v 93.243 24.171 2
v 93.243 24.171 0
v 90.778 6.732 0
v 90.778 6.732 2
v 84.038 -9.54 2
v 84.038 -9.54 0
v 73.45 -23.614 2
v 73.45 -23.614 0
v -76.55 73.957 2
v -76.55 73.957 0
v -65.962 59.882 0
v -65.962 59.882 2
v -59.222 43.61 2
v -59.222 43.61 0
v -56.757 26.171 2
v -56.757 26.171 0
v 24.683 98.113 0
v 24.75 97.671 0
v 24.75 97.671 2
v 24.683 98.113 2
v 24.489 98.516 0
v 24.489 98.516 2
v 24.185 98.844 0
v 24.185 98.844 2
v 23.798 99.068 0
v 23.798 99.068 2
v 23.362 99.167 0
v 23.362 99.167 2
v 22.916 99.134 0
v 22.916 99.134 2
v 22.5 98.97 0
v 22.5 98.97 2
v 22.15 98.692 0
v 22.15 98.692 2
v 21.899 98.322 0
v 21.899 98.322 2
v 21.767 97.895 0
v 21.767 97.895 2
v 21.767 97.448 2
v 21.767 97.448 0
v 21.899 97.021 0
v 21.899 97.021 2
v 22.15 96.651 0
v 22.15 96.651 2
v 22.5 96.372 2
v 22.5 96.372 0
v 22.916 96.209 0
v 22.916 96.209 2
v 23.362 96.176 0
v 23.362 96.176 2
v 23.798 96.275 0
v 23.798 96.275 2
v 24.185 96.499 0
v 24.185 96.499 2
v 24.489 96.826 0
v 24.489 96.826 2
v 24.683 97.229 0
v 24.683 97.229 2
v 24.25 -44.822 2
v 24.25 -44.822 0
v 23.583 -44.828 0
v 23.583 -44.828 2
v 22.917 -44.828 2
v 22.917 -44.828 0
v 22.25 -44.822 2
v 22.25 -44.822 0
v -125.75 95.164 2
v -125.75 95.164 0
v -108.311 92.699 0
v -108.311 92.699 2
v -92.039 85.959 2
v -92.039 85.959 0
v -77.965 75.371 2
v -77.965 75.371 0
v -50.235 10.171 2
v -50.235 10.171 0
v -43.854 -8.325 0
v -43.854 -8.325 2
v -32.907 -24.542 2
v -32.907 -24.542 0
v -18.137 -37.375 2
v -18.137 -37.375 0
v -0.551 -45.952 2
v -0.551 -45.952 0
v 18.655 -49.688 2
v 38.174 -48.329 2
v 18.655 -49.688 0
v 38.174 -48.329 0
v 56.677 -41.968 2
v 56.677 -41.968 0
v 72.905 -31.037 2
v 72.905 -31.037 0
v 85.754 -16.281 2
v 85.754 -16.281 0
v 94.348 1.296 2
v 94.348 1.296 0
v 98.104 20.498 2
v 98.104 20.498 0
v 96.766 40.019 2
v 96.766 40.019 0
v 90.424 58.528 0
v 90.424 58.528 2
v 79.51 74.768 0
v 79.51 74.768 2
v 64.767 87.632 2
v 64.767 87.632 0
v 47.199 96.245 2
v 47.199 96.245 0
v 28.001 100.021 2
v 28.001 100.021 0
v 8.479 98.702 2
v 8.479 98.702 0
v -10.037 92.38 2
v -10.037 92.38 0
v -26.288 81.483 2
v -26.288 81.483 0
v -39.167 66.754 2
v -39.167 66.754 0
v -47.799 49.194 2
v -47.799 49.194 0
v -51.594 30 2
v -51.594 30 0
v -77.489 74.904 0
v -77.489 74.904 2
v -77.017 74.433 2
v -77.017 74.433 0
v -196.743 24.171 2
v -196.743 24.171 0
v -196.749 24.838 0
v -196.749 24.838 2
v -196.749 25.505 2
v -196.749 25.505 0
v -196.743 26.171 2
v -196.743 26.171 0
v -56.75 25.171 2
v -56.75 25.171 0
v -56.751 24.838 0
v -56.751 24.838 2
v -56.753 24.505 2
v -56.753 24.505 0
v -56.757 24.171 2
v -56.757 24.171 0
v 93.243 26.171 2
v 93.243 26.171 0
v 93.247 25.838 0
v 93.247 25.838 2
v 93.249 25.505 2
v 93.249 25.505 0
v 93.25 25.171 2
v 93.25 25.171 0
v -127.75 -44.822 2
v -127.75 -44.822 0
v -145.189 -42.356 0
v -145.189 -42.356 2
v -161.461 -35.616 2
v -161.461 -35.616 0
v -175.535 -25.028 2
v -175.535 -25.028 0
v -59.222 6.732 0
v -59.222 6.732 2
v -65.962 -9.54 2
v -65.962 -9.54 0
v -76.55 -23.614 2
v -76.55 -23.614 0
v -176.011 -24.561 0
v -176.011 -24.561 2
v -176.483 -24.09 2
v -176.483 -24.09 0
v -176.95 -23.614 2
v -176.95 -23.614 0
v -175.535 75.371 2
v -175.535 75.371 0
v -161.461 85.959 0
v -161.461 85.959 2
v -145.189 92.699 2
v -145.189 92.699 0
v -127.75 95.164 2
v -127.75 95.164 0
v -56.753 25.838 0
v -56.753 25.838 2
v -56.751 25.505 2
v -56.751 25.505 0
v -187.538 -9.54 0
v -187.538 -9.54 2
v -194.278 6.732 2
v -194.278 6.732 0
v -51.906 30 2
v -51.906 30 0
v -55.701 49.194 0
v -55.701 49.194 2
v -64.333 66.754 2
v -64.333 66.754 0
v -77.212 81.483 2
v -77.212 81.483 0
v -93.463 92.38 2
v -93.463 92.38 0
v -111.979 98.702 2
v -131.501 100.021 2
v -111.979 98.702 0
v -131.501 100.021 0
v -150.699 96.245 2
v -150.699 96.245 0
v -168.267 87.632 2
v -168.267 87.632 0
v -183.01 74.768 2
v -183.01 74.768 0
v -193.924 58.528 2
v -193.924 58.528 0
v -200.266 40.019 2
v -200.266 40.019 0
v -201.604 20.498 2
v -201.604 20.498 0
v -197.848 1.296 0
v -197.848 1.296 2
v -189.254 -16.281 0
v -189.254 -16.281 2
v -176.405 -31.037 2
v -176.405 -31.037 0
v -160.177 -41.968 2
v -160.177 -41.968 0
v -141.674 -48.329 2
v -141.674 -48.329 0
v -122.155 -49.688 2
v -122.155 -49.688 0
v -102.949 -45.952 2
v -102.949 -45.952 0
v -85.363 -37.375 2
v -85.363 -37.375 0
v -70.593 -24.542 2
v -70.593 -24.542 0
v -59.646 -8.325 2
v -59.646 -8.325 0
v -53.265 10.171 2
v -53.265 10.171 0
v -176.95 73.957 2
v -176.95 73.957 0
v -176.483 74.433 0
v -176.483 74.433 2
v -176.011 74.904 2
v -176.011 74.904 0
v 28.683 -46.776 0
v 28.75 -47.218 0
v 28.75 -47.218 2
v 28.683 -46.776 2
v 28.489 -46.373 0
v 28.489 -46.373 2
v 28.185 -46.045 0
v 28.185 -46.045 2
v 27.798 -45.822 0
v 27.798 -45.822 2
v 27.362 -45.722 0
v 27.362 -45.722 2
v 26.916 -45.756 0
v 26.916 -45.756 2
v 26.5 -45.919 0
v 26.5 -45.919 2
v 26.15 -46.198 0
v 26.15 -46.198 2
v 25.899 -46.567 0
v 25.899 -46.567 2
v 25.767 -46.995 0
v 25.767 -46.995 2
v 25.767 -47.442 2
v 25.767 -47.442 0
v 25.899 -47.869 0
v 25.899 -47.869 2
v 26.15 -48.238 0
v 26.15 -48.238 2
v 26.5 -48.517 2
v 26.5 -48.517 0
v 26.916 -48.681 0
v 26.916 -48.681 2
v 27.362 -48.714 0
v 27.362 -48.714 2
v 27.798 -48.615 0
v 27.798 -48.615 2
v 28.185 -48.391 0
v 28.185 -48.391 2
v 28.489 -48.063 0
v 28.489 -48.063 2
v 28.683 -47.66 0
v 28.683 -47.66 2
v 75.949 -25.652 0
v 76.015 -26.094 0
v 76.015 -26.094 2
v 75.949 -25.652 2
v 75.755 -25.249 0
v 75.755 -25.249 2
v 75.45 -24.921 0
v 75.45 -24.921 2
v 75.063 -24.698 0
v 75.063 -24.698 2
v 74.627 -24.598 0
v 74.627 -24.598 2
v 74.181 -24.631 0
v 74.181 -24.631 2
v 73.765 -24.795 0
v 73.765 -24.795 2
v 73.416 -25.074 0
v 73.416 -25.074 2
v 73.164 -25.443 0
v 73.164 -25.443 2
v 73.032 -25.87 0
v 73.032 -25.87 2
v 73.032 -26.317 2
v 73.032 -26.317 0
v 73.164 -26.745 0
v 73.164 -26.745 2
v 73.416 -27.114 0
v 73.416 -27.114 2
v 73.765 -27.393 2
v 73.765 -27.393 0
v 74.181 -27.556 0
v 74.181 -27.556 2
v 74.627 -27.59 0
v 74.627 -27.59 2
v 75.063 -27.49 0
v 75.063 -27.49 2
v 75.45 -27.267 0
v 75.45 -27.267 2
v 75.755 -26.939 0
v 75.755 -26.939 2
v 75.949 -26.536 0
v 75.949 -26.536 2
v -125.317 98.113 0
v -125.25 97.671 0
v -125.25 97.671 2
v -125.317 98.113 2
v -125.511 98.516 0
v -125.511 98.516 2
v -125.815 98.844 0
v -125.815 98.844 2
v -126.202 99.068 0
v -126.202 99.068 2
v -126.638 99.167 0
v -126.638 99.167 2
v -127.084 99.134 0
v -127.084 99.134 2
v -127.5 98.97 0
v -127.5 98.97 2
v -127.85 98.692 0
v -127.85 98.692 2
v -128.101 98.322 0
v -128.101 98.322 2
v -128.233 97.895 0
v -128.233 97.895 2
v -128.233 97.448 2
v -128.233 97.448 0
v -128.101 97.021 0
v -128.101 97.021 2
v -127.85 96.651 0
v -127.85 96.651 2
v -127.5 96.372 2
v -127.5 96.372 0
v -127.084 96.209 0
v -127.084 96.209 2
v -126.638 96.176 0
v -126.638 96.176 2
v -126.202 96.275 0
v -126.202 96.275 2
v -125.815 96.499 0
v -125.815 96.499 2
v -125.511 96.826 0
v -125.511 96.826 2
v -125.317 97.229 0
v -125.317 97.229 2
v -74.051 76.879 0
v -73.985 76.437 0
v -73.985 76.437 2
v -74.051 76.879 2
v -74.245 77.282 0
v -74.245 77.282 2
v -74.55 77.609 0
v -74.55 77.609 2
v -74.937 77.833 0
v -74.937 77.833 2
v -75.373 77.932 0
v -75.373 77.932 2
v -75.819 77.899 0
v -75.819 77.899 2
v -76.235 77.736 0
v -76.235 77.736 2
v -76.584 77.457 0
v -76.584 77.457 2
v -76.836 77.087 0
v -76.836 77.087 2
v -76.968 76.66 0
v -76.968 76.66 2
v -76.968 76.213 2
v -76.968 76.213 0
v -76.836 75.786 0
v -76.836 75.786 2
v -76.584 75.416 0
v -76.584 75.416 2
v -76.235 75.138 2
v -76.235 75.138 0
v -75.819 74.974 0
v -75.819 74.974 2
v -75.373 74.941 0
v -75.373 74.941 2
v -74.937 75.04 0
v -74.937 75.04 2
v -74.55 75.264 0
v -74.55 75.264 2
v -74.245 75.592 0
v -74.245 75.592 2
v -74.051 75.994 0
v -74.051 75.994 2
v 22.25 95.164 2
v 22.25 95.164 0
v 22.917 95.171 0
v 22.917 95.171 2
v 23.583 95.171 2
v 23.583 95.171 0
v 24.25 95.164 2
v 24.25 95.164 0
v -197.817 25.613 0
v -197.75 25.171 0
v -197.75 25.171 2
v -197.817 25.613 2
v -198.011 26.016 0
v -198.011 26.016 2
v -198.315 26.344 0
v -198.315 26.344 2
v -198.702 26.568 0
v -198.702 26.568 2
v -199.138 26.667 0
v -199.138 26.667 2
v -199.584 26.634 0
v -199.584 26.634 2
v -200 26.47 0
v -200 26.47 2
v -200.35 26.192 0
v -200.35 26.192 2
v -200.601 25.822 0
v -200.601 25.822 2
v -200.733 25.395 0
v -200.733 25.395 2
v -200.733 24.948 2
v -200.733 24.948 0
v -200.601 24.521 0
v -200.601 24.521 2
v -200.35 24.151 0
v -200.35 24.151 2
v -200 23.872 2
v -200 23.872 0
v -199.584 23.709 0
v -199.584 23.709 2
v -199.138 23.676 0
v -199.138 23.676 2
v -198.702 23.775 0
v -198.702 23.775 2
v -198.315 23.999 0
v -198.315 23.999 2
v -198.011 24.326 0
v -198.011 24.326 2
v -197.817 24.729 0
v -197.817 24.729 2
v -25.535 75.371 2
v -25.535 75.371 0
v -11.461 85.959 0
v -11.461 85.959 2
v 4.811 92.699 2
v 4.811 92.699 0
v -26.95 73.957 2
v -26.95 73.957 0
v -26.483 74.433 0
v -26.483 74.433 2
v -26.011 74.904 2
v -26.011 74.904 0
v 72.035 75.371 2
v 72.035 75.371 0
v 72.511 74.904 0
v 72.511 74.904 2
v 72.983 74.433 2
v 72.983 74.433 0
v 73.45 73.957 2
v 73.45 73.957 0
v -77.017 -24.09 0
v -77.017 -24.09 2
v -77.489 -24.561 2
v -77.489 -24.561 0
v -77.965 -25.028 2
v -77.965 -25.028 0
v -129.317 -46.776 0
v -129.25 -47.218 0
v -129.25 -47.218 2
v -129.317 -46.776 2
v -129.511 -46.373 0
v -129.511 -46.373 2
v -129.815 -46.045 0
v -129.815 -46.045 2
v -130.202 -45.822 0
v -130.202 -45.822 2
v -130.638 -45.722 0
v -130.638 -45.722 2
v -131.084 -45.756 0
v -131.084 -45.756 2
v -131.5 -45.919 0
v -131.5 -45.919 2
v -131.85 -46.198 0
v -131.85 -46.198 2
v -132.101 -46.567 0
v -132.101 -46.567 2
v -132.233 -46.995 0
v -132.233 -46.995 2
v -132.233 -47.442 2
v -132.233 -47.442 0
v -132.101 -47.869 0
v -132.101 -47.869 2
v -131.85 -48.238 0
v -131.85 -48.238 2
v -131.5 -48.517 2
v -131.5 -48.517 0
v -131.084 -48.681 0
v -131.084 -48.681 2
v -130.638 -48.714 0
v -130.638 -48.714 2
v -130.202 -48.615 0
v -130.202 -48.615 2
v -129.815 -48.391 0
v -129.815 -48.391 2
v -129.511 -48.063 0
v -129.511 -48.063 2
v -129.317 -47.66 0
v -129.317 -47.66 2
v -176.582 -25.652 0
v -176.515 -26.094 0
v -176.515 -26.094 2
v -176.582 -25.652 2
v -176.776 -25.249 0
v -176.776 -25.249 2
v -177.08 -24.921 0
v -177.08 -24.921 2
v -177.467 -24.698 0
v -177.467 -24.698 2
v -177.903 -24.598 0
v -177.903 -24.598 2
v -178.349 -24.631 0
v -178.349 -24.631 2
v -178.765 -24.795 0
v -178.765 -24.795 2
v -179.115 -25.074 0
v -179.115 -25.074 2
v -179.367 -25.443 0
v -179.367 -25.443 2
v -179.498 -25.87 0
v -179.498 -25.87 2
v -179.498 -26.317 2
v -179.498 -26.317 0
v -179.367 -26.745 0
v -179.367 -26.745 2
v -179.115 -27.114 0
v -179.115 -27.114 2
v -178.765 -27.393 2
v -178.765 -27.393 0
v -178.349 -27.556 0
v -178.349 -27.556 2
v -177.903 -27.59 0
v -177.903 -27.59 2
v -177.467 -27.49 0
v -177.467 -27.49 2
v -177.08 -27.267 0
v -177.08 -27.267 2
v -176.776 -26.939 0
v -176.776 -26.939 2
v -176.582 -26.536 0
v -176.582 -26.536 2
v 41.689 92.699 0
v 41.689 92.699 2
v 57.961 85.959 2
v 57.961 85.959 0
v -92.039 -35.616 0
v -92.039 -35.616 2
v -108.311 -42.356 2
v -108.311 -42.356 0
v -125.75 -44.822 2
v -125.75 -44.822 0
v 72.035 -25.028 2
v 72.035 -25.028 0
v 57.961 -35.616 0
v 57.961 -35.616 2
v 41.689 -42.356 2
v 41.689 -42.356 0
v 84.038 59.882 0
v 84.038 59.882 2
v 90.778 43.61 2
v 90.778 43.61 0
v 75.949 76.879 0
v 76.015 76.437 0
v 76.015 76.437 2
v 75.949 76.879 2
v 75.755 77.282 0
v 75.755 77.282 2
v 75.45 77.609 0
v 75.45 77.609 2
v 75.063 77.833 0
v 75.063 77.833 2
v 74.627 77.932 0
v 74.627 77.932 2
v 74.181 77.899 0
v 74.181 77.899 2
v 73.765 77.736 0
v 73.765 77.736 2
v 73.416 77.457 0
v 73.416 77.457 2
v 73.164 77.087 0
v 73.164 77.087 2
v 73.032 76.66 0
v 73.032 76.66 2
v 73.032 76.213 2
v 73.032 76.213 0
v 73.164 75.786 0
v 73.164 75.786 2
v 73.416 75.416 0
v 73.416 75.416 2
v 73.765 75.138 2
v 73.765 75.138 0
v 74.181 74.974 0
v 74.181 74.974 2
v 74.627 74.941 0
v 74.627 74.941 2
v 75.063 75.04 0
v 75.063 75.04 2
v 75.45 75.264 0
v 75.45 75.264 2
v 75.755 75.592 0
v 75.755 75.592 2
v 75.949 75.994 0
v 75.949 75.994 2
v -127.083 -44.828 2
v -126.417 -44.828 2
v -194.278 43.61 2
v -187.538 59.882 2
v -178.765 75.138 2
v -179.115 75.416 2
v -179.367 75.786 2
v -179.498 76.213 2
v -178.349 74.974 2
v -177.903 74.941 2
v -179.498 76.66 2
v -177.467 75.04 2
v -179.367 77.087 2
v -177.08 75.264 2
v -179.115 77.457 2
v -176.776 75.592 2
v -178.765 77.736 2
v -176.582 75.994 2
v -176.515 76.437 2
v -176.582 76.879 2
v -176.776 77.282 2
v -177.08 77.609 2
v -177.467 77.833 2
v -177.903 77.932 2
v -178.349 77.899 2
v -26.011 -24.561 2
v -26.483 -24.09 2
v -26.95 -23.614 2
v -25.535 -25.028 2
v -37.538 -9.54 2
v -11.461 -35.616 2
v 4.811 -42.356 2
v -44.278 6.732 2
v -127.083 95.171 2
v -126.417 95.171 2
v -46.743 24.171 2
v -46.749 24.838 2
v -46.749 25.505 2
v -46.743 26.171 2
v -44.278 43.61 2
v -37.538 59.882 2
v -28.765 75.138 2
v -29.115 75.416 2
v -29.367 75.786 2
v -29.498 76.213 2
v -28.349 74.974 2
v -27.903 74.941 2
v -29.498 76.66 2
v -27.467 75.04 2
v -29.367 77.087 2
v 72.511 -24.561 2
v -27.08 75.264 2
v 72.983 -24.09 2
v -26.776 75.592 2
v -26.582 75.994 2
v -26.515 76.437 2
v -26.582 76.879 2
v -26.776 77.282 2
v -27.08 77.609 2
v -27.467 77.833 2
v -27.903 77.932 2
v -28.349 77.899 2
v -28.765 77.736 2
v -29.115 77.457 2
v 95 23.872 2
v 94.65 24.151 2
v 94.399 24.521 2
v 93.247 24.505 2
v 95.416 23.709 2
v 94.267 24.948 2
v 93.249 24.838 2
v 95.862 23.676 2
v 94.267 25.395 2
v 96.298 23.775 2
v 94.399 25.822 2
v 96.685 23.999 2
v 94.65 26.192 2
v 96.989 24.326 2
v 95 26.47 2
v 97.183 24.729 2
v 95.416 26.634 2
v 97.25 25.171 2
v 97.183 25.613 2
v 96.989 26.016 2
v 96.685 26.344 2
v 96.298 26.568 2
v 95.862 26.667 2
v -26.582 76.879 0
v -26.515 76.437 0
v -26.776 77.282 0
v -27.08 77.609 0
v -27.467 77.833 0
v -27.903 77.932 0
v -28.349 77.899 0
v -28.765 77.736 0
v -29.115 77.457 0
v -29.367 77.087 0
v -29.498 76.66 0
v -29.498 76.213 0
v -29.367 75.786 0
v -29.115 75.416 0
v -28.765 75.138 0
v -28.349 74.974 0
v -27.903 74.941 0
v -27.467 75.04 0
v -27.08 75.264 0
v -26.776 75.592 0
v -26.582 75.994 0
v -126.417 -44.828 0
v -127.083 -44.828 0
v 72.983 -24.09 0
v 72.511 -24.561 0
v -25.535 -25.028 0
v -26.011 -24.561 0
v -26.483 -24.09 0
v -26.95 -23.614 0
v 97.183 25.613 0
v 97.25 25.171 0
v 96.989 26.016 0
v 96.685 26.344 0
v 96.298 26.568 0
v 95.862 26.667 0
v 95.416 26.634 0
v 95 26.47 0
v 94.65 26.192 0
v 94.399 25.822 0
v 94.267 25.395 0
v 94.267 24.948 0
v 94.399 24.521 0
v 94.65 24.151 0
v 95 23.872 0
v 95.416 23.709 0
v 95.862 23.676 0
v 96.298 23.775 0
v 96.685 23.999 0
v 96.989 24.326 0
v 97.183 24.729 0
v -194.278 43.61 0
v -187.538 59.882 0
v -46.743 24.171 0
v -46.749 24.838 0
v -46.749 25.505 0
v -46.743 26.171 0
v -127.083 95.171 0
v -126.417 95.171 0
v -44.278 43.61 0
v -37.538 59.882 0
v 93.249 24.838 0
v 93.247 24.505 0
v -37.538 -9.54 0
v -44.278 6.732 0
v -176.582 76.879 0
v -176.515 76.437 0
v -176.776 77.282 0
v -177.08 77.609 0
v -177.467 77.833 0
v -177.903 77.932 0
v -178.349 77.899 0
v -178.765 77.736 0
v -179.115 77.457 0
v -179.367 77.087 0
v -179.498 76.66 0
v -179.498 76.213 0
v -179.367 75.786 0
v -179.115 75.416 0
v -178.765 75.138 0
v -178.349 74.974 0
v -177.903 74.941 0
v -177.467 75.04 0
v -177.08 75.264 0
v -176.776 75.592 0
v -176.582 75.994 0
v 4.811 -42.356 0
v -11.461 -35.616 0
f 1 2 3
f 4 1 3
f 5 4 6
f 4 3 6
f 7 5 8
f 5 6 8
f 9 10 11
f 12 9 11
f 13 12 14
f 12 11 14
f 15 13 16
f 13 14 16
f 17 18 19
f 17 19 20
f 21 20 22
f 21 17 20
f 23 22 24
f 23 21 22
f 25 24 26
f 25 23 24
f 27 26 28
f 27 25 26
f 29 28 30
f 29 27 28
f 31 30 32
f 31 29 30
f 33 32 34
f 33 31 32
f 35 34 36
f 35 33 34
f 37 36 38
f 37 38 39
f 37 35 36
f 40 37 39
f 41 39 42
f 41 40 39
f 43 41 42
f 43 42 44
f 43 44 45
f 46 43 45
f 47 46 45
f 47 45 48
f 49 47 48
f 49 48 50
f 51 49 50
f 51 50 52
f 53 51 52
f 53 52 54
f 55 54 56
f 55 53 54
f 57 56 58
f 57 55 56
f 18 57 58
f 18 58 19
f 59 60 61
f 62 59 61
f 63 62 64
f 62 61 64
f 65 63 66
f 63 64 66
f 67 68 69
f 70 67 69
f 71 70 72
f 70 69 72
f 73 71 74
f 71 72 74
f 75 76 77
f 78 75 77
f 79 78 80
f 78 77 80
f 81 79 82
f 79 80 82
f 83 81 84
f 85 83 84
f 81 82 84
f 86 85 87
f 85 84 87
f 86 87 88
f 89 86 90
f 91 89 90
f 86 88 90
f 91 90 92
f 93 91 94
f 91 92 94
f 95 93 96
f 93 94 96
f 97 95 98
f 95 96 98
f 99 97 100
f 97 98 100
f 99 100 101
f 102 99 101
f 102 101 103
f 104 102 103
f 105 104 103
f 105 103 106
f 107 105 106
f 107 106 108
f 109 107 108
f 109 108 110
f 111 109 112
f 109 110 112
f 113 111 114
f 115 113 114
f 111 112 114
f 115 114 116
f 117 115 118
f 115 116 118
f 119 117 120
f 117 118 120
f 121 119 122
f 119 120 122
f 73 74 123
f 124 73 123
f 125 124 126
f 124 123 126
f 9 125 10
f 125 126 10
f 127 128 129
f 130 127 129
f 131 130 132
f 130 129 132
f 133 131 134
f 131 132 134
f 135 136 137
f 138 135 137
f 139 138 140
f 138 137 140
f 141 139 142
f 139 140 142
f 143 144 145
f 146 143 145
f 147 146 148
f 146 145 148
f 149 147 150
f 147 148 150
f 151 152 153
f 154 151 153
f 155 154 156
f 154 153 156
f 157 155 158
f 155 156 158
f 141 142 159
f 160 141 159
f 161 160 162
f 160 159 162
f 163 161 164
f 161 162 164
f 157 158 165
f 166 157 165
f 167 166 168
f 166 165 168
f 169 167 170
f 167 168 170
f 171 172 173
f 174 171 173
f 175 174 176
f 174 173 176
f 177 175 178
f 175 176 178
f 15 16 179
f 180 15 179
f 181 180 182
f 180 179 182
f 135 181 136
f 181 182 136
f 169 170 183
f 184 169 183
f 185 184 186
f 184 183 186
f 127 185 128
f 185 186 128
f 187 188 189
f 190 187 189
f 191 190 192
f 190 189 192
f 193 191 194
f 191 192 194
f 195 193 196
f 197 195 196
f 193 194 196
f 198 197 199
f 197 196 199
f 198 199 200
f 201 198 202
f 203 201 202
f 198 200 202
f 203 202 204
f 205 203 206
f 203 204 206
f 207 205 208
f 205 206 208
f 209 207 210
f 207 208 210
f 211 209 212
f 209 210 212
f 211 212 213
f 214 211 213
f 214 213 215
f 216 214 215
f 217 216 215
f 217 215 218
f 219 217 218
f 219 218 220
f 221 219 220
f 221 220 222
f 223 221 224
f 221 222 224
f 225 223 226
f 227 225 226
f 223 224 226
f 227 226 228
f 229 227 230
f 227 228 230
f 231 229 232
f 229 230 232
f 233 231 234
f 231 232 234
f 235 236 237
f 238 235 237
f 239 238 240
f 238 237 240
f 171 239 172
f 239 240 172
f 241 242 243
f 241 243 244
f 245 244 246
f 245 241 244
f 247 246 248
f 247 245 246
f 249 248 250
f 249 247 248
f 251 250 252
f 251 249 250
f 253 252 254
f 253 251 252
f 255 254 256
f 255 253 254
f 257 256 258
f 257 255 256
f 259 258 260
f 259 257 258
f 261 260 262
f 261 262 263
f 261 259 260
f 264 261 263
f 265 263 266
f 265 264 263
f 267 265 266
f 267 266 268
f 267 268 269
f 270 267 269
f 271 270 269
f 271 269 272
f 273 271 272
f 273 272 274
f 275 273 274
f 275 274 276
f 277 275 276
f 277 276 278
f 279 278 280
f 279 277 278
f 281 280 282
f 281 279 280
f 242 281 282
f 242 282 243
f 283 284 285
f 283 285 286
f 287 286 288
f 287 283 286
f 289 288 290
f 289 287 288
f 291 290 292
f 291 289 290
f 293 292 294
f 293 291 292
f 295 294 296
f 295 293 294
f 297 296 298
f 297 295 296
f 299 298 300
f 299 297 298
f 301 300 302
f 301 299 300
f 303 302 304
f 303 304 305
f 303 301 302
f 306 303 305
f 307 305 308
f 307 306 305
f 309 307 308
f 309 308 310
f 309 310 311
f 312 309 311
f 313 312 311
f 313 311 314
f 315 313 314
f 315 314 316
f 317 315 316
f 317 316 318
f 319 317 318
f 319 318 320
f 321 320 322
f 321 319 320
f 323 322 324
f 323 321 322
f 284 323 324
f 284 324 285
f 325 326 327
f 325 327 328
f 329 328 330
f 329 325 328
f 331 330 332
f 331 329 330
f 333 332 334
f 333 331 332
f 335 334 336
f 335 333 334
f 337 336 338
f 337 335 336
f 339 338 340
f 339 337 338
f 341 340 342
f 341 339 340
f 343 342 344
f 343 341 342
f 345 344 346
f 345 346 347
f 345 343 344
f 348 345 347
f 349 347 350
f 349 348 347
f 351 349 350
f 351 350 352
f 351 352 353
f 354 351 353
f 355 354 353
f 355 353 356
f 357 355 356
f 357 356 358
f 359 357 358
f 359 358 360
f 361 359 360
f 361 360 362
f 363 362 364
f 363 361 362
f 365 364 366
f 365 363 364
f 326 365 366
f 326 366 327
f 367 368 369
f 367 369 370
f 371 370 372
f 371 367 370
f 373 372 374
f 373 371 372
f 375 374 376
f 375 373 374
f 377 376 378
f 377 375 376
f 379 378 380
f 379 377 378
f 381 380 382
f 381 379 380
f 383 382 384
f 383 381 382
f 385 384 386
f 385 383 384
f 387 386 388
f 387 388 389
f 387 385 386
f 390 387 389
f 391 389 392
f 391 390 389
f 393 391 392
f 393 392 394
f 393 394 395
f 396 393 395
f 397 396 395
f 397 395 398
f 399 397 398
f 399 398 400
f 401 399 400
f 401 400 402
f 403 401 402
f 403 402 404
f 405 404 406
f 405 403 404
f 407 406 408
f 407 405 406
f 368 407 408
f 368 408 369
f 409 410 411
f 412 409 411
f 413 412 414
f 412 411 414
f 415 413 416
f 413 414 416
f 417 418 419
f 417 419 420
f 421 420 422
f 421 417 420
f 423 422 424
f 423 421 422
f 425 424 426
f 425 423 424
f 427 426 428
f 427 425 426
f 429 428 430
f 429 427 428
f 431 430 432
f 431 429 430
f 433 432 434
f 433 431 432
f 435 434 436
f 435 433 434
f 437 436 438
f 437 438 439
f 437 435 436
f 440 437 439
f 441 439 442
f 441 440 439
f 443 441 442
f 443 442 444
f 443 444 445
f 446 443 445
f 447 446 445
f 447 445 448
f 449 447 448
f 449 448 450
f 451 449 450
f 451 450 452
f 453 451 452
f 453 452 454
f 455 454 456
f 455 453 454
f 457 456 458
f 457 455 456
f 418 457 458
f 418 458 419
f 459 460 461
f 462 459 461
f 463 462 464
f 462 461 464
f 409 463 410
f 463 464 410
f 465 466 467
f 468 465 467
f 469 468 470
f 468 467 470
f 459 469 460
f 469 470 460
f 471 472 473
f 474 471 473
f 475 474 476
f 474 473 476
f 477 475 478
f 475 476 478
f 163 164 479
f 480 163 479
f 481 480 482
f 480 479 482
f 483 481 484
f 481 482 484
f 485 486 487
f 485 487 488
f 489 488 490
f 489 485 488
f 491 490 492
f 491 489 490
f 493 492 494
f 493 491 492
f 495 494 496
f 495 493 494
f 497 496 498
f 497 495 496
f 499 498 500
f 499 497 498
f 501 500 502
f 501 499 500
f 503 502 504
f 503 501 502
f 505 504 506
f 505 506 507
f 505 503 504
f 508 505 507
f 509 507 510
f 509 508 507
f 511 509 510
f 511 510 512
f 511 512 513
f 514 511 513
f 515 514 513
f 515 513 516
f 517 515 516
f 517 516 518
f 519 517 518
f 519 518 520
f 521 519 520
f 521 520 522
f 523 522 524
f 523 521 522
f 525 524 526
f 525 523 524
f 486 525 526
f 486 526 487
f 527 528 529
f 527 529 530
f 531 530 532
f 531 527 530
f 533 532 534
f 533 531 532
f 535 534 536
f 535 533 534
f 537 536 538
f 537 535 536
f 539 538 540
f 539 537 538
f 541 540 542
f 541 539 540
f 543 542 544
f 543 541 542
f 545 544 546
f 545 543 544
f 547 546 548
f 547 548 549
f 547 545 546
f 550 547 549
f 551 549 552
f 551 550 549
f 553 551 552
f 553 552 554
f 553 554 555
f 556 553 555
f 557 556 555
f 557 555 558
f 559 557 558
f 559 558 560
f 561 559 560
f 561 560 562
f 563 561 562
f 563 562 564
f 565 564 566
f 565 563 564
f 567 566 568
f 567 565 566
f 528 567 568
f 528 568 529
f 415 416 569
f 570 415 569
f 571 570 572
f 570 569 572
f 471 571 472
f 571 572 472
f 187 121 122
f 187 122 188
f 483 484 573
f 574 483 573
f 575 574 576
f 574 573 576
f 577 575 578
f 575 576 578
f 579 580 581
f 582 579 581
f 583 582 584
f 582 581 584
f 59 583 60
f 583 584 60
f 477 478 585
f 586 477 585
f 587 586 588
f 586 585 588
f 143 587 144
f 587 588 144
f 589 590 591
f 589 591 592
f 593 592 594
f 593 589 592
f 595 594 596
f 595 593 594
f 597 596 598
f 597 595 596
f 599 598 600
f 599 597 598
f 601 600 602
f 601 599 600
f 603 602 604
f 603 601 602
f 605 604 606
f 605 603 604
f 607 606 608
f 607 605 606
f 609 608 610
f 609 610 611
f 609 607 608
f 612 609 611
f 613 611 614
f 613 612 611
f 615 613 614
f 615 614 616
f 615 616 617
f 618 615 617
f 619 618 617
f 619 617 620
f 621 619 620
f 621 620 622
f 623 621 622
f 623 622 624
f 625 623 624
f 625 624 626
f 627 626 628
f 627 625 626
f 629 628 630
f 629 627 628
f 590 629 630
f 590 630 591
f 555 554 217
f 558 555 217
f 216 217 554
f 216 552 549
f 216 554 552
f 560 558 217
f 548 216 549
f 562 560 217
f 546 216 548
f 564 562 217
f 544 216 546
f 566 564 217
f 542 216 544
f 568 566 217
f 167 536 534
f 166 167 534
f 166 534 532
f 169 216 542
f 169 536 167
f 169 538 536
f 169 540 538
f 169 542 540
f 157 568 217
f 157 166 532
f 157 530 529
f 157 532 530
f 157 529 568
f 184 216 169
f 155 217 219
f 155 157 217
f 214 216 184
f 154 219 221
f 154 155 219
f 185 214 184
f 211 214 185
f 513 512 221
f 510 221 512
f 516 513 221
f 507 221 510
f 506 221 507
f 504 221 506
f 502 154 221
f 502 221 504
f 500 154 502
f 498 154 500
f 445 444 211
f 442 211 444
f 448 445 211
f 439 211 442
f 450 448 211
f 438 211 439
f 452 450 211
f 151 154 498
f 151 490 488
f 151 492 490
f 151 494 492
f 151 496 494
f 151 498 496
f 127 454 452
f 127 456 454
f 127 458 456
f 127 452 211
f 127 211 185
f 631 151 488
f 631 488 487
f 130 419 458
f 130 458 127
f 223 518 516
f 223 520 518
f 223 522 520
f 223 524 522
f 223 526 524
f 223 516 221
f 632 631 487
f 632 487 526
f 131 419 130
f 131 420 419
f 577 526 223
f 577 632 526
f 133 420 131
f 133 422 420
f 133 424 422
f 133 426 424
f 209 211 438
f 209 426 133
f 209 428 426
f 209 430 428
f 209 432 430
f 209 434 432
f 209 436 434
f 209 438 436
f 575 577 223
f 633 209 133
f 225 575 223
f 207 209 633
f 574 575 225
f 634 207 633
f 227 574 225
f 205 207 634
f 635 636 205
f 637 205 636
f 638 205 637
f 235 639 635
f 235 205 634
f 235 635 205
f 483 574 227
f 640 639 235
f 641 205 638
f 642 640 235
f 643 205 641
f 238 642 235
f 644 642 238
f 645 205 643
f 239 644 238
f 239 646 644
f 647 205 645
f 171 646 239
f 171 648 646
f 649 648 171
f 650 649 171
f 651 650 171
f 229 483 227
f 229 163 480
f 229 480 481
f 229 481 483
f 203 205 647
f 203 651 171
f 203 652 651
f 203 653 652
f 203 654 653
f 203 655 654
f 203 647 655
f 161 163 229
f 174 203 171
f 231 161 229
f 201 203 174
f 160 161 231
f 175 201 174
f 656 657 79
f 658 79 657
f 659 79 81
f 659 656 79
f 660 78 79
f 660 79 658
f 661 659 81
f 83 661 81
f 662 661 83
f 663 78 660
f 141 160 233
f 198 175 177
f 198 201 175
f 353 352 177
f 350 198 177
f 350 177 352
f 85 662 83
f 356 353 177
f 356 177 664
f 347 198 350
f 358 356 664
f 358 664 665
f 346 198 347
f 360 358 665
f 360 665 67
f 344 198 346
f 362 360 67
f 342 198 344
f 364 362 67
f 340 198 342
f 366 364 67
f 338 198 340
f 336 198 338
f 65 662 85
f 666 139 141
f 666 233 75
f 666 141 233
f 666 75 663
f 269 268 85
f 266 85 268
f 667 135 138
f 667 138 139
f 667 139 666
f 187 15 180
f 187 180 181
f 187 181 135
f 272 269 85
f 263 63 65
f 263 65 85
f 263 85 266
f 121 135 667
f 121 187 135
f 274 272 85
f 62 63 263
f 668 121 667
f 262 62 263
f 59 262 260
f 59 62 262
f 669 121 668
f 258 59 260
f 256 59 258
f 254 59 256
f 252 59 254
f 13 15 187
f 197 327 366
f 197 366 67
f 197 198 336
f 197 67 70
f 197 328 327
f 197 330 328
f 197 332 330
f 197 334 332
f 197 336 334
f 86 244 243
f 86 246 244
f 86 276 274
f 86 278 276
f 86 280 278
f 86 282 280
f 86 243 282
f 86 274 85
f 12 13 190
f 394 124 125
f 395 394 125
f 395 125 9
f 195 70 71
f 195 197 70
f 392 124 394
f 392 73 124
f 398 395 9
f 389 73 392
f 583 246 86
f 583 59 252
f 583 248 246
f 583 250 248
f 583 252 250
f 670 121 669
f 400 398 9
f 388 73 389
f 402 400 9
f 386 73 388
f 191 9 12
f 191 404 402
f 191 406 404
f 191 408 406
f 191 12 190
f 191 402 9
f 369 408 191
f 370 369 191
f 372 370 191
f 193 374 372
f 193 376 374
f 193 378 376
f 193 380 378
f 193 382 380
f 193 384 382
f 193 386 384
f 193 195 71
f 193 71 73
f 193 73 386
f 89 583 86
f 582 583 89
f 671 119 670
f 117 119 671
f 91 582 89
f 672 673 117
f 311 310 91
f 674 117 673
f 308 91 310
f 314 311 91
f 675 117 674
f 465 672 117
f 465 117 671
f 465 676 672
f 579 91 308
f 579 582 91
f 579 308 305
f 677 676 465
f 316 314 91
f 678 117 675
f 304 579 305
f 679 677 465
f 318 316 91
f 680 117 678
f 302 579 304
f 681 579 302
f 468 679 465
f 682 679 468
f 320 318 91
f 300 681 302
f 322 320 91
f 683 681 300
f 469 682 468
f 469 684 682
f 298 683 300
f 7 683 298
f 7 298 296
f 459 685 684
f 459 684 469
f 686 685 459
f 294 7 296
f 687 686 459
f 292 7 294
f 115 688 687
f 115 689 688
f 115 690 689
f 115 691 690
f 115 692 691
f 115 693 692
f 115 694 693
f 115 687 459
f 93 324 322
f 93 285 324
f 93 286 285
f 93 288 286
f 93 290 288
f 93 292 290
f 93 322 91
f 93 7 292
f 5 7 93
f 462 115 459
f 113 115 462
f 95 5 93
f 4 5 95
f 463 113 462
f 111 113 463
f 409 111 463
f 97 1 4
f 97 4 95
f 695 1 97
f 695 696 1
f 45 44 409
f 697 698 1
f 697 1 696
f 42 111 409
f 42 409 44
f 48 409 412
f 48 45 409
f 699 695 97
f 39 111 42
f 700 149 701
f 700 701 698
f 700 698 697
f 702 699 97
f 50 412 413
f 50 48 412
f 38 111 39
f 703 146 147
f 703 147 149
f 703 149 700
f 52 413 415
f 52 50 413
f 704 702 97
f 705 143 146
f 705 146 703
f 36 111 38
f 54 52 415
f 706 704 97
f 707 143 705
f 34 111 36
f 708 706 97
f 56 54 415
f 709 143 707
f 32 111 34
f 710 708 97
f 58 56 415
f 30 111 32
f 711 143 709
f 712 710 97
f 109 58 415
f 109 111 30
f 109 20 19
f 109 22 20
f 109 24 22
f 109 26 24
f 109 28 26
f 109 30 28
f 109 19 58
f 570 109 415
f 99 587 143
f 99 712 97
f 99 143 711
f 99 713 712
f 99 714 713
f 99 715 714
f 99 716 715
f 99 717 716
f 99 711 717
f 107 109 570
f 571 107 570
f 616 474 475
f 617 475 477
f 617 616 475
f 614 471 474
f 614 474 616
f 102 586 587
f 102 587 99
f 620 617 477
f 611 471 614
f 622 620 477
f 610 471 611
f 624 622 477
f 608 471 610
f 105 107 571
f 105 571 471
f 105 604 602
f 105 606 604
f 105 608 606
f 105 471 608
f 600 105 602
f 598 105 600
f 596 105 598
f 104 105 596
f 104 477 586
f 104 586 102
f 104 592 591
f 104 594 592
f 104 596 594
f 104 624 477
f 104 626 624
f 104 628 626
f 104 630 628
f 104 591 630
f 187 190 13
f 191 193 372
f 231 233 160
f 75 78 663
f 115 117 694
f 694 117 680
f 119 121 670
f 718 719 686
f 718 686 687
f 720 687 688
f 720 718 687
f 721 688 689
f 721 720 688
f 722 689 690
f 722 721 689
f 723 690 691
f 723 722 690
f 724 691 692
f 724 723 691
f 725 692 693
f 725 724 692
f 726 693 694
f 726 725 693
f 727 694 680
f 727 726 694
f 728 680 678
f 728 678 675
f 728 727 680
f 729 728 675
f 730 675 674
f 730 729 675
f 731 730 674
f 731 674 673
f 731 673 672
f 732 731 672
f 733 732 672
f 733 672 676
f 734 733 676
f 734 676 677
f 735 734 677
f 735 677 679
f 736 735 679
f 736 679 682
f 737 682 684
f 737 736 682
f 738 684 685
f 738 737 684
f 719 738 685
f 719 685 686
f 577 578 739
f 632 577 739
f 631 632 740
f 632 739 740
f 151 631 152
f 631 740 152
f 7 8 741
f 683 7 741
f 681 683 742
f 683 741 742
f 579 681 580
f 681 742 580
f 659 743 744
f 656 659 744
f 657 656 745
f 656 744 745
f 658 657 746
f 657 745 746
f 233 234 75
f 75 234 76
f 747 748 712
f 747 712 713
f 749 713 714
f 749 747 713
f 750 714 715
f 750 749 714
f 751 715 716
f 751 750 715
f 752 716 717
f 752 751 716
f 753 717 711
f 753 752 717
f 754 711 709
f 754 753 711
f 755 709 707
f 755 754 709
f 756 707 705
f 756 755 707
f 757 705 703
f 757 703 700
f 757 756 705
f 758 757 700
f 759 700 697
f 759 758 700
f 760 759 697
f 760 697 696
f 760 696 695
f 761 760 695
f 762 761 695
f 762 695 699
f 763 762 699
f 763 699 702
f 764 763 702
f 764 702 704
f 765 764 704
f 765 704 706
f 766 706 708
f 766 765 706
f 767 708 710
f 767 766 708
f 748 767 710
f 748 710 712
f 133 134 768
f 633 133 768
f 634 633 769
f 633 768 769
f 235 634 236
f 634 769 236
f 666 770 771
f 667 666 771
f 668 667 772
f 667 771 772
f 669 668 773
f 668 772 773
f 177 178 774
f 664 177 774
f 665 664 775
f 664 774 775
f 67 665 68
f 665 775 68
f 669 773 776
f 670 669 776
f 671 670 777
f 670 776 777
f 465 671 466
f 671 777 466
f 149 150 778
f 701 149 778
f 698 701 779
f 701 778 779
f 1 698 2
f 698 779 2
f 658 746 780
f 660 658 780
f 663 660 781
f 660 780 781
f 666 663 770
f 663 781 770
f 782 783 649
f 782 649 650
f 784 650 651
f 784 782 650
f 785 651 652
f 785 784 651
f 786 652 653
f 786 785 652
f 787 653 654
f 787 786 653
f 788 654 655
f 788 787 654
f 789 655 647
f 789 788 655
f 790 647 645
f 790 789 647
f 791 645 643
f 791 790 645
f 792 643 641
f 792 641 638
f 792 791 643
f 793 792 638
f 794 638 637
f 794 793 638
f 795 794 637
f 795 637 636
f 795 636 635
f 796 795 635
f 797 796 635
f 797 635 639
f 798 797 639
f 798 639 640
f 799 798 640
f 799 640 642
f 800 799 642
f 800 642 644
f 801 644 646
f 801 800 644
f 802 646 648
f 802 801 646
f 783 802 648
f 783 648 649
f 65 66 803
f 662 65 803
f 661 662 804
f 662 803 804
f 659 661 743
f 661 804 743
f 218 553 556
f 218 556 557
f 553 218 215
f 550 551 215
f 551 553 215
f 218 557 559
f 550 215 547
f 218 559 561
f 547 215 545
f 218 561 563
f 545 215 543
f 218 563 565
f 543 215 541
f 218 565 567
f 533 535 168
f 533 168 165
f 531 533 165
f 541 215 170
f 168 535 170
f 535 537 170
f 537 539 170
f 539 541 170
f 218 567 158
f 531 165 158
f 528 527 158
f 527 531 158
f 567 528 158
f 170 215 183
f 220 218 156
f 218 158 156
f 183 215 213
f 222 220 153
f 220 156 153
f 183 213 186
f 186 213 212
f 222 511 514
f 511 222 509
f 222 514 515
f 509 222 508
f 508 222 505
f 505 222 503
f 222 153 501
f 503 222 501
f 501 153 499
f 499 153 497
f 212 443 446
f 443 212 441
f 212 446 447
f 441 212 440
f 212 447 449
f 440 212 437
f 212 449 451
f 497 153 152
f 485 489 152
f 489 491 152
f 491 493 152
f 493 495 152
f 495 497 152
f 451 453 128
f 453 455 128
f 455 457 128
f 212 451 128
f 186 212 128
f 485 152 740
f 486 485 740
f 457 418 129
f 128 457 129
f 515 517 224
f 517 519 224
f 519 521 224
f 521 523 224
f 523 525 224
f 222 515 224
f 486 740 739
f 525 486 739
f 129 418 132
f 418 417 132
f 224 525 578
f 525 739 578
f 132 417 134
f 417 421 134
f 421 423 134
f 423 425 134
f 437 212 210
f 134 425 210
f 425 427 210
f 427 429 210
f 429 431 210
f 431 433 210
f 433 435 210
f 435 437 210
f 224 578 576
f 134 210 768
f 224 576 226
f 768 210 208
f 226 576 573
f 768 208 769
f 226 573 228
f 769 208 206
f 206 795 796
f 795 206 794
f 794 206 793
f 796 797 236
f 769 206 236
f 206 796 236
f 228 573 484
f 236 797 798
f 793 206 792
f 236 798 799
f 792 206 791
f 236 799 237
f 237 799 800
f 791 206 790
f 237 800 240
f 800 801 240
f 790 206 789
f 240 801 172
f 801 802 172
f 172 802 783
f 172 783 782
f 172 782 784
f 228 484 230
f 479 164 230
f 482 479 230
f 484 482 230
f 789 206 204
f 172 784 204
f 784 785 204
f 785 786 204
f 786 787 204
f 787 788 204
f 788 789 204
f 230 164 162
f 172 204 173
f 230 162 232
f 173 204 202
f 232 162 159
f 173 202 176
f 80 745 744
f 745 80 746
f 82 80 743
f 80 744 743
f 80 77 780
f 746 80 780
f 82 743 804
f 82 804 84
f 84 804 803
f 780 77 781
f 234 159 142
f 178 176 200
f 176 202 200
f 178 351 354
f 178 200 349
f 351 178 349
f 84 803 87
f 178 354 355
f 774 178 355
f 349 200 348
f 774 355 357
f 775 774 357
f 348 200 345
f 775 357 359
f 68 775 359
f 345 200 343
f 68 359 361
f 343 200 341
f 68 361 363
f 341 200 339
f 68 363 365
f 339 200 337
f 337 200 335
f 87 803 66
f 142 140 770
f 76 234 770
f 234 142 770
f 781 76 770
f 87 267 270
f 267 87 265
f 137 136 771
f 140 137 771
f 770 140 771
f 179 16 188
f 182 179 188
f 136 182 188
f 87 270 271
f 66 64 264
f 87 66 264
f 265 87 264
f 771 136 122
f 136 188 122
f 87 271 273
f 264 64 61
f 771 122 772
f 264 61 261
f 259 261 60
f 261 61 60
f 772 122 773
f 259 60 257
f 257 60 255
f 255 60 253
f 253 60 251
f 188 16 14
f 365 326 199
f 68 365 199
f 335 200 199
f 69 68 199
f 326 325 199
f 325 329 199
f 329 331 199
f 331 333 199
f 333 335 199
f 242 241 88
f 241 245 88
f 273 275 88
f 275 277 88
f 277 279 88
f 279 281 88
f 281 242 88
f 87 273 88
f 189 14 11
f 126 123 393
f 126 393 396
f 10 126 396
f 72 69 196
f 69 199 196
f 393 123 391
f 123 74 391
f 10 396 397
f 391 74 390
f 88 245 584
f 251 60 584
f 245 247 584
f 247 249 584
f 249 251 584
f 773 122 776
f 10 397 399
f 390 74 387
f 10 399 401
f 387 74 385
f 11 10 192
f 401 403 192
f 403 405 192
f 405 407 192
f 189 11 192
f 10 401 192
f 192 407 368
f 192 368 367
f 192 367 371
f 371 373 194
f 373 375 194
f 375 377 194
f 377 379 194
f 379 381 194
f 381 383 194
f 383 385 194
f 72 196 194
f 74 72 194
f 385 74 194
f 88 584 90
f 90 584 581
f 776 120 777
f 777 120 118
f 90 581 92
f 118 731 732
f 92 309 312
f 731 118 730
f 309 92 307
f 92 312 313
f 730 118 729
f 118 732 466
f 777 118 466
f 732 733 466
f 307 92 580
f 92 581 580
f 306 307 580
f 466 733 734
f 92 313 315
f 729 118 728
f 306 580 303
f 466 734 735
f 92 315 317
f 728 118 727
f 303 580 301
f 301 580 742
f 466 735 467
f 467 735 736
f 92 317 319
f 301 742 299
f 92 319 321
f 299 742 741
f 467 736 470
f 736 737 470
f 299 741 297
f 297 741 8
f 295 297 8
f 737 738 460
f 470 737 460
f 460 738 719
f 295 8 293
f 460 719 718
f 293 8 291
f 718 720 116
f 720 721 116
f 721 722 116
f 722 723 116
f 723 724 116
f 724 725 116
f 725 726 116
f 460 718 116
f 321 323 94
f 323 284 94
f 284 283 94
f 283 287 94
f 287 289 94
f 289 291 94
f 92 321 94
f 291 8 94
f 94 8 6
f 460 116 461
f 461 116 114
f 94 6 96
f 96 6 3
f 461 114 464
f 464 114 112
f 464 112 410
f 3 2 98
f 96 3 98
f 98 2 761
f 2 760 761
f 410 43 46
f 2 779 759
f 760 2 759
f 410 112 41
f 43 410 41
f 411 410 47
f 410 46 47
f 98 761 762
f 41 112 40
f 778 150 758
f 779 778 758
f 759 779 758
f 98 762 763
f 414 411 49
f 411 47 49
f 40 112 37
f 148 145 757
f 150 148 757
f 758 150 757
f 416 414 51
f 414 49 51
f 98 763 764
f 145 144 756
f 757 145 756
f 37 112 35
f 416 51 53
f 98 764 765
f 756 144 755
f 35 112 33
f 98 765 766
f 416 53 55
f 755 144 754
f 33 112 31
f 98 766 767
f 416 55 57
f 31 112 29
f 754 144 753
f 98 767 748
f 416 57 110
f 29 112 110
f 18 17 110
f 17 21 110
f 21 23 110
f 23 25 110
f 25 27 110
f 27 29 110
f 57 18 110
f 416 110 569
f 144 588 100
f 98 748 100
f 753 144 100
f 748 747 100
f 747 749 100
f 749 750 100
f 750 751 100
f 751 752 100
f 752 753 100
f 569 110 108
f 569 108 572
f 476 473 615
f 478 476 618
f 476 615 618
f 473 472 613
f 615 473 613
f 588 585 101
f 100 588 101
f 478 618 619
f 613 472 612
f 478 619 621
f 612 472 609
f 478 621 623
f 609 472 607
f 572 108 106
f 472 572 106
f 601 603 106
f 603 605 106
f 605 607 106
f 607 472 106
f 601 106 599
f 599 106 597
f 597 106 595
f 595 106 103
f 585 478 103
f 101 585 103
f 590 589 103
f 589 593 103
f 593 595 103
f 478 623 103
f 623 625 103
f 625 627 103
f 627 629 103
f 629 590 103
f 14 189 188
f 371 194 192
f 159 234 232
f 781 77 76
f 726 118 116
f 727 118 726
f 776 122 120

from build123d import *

# Parameters (mm, degrees)
SKETCH_2_R      = 1.5
EXTRUDE_2_DEPTH = 2


with BuildPart() as part:
    # 草图2 → 凸台-拉伸2 (new body)
    with BuildSketch(Plane.XY):
        with BuildLine():
            ThreePointArc((-51.905600365, 30), (-201.574285493, 30.30226796), (-53.265307717, 10.171351817))
            Line((-53.265307717, 10.171351817), (-50.234692283, 10.171351817))
            ThreePointArc((-50.234692283, 10.171351817), (98.074285493, 30.30226796), (-51.594399635, 30))
            Line((-51.594399635, 30), (-51.905600365, 30))
        make_face()
        with Locations((-130.75, -47.218219255)):
            Circle(SKETCH_2_R, mode=Mode.SUBTRACT)
        with Locations((-178.015241636, -26.093889819)):
            Circle(SKETCH_2_R, mode=Mode.SUBTRACT)
        with Locations((27.25, -47.218219255)):
            Circle(SKETCH_2_R, mode=Mode.SUBTRACT)
        with Locations((74.515241636, -26.093889819)):
            Circle(SKETCH_2_R, mode=Mode.SUBTRACT)
        with Locations((-199.25, 25.171351817)):
            Circle(SKETCH_2_R, mode=Mode.SUBTRACT)
        with BuildLine():
            ThreePointArc((-56.757143222, 26.171351817), (-56.751785828, 25.671364573), (-56.75, 25.171351817))
            ThreePointArc((-56.75, 25.171351817), (-56.751785828, 24.671339061), (-56.757143222, 24.171351817))
            ThreePointArc((-56.757143222, 24.171351817), (-62.078432724, -1.616488449), (-76.550469556, -23.613965065))
            ThreePointArc((-76.550469556, -23.613965065), (-77.252525317, -24.326122866), (-77.964683119, -25.028178627))
            ThreePointArc((-77.964683119, -25.028178627), (-99.962159734, -39.500215459), (-125.75, -44.821504962))
            ThreePointArc((-125.75, -44.821504962), (-126.75, -44.828648183), (-127.75, -44.821504962))
            ThreePointArc((-127.75, -44.821504962), (-153.537840266, -39.500215459), (-175.535316881, -25.028178627))
            ThreePointArc((-175.535316881, -25.028178627), (-176.247474683, -24.326122866), (-176.949530444, -23.613965065))
            ThreePointArc((-176.949530444, -23.613965065), (-191.421567276, -1.616488449), (-196.742856778, 24.171351817))
            ThreePointArc((-196.742856778, 24.171351817), (-196.75, 25.171351817), (-196.742856778, 26.171351817))
            ThreePointArc((-196.742856778, 26.171351817), (-191.421567276, 51.959192082), (-176.949530444, 73.956668698))
            ThreePointArc((-176.949530444, 73.956668698), (-176.247474683, 74.6688265), (-175.535316881, 75.370882261))
            ThreePointArc((-175.535316881, 75.370882261), (-153.537840266, 89.842919093), (-127.75, 95.164208595))
            ThreePointArc((-127.75, 95.164208595), (-126.75, 95.171351817), (-125.75, 95.164208595))
            ThreePointArc((-125.75, 95.164208595), (-99.962159734, 89.842919093), (-77.964683119, 75.370882261))
            ThreePointArc((-77.964683119, 75.370882261), (-77.252525317, 74.6688265), (-76.550469556, 73.956668698))
            ThreePointArc((-76.550469556, 73.956668698), (-62.078432724, 51.959192082), (-56.757143222, 26.171351817))
        make_face(mode=Mode.SUBTRACT)
        with Locations((-178.015241636, 76.436593453)):
            Circle(SKETCH_2_R, mode=Mode.SUBTRACT)
        with Locations((-75.484758364, 76.436593453)):
            Circle(SKETCH_2_R, mode=Mode.SUBTRACT)
        with Locations((-126.75, 97.671351817)):
            Circle(SKETCH_2_R, mode=Mode.SUBTRACT)
        with BuildLine():
            ThreePointArc((93.242856778, 26.171351817), (93.248214172, 25.671364573), (93.25, 25.171351817))
            ThreePointArc((93.25, 25.171351817), (93.248214172, 24.671339061), (93.242856778, 24.171351817))
            ThreePointArc((93.242856778, 24.171351817), (87.921567276, -1.616488449), (73.449530444, -23.613965065))
            ThreePointArc((73.449530444, -23.613965065), (72.747474683, -24.326122866), (72.035316881, -25.028178627))
            ThreePointArc((72.035316881, -25.028178627), (50.037840266, -39.500215459), (24.25, -44.821504962))
            ThreePointArc((24.25, -44.821504962), (23.25, -44.828648183), (22.25, -44.821504962))
            ThreePointArc((22.25, -44.821504962), (-3.537840266, -39.500215459), (-25.535316881, -25.028178627))
            ThreePointArc((-25.535316881, -25.028178627), (-26.247474683, -24.326122866), (-26.949530444, -23.613965065))
            ThreePointArc((-26.949530444, -23.613965065), (-41.421567276, -1.616488449), (-46.742856778, 24.171351817))
            ThreePointArc((-46.742856778, 24.171351817), (-46.75, 25.171351817), (-46.742856778, 26.171351817))
            ThreePointArc((-46.742856778, 26.171351817), (-41.421567276, 51.959192082), (-26.949530444, 73.956668698))
            ThreePointArc((-26.949530444, 73.956668698), (-26.247474683, 74.6688265), (-25.535316881, 75.370882261))
            ThreePointArc((-25.535316881, 75.370882261), (-3.537840266, 89.842919093), (22.25, 95.164208595))
            ThreePointArc((22.25, 95.164208595), (23.25, 95.171351817), (24.25, 95.164208595))
            ThreePointArc((24.25, 95.164208595), (50.037840266, 89.842919093), (72.035316881, 75.370882261))
            ThreePointArc((72.035316881, 75.370882261), (72.747474683, 74.6688265), (73.449530444, 73.956668698))
            ThreePointArc((73.449530444, 73.956668698), (87.921567276, 51.959192082), (93.242856778, 26.171351817))
        make_face(mode=Mode.SUBTRACT)
        with Locations((95.75, 25.171351817)):
            Circle(SKETCH_2_R, mode=Mode.SUBTRACT)
        with Locations((-28.015241636, 76.436593453)):
            Circle(SKETCH_2_R, mode=Mode.SUBTRACT)
        with Locations((23.25, 97.671351817)):
            Circle(SKETCH_2_R, mode=Mode.SUBTRACT)
        with Locations((74.515241636, 76.436593453)):
            Circle(SKETCH_2_R, mode=Mode.SUBTRACT)
    extrude(amount=EXTRUDE_2_DEPTH)


solid = part.part
